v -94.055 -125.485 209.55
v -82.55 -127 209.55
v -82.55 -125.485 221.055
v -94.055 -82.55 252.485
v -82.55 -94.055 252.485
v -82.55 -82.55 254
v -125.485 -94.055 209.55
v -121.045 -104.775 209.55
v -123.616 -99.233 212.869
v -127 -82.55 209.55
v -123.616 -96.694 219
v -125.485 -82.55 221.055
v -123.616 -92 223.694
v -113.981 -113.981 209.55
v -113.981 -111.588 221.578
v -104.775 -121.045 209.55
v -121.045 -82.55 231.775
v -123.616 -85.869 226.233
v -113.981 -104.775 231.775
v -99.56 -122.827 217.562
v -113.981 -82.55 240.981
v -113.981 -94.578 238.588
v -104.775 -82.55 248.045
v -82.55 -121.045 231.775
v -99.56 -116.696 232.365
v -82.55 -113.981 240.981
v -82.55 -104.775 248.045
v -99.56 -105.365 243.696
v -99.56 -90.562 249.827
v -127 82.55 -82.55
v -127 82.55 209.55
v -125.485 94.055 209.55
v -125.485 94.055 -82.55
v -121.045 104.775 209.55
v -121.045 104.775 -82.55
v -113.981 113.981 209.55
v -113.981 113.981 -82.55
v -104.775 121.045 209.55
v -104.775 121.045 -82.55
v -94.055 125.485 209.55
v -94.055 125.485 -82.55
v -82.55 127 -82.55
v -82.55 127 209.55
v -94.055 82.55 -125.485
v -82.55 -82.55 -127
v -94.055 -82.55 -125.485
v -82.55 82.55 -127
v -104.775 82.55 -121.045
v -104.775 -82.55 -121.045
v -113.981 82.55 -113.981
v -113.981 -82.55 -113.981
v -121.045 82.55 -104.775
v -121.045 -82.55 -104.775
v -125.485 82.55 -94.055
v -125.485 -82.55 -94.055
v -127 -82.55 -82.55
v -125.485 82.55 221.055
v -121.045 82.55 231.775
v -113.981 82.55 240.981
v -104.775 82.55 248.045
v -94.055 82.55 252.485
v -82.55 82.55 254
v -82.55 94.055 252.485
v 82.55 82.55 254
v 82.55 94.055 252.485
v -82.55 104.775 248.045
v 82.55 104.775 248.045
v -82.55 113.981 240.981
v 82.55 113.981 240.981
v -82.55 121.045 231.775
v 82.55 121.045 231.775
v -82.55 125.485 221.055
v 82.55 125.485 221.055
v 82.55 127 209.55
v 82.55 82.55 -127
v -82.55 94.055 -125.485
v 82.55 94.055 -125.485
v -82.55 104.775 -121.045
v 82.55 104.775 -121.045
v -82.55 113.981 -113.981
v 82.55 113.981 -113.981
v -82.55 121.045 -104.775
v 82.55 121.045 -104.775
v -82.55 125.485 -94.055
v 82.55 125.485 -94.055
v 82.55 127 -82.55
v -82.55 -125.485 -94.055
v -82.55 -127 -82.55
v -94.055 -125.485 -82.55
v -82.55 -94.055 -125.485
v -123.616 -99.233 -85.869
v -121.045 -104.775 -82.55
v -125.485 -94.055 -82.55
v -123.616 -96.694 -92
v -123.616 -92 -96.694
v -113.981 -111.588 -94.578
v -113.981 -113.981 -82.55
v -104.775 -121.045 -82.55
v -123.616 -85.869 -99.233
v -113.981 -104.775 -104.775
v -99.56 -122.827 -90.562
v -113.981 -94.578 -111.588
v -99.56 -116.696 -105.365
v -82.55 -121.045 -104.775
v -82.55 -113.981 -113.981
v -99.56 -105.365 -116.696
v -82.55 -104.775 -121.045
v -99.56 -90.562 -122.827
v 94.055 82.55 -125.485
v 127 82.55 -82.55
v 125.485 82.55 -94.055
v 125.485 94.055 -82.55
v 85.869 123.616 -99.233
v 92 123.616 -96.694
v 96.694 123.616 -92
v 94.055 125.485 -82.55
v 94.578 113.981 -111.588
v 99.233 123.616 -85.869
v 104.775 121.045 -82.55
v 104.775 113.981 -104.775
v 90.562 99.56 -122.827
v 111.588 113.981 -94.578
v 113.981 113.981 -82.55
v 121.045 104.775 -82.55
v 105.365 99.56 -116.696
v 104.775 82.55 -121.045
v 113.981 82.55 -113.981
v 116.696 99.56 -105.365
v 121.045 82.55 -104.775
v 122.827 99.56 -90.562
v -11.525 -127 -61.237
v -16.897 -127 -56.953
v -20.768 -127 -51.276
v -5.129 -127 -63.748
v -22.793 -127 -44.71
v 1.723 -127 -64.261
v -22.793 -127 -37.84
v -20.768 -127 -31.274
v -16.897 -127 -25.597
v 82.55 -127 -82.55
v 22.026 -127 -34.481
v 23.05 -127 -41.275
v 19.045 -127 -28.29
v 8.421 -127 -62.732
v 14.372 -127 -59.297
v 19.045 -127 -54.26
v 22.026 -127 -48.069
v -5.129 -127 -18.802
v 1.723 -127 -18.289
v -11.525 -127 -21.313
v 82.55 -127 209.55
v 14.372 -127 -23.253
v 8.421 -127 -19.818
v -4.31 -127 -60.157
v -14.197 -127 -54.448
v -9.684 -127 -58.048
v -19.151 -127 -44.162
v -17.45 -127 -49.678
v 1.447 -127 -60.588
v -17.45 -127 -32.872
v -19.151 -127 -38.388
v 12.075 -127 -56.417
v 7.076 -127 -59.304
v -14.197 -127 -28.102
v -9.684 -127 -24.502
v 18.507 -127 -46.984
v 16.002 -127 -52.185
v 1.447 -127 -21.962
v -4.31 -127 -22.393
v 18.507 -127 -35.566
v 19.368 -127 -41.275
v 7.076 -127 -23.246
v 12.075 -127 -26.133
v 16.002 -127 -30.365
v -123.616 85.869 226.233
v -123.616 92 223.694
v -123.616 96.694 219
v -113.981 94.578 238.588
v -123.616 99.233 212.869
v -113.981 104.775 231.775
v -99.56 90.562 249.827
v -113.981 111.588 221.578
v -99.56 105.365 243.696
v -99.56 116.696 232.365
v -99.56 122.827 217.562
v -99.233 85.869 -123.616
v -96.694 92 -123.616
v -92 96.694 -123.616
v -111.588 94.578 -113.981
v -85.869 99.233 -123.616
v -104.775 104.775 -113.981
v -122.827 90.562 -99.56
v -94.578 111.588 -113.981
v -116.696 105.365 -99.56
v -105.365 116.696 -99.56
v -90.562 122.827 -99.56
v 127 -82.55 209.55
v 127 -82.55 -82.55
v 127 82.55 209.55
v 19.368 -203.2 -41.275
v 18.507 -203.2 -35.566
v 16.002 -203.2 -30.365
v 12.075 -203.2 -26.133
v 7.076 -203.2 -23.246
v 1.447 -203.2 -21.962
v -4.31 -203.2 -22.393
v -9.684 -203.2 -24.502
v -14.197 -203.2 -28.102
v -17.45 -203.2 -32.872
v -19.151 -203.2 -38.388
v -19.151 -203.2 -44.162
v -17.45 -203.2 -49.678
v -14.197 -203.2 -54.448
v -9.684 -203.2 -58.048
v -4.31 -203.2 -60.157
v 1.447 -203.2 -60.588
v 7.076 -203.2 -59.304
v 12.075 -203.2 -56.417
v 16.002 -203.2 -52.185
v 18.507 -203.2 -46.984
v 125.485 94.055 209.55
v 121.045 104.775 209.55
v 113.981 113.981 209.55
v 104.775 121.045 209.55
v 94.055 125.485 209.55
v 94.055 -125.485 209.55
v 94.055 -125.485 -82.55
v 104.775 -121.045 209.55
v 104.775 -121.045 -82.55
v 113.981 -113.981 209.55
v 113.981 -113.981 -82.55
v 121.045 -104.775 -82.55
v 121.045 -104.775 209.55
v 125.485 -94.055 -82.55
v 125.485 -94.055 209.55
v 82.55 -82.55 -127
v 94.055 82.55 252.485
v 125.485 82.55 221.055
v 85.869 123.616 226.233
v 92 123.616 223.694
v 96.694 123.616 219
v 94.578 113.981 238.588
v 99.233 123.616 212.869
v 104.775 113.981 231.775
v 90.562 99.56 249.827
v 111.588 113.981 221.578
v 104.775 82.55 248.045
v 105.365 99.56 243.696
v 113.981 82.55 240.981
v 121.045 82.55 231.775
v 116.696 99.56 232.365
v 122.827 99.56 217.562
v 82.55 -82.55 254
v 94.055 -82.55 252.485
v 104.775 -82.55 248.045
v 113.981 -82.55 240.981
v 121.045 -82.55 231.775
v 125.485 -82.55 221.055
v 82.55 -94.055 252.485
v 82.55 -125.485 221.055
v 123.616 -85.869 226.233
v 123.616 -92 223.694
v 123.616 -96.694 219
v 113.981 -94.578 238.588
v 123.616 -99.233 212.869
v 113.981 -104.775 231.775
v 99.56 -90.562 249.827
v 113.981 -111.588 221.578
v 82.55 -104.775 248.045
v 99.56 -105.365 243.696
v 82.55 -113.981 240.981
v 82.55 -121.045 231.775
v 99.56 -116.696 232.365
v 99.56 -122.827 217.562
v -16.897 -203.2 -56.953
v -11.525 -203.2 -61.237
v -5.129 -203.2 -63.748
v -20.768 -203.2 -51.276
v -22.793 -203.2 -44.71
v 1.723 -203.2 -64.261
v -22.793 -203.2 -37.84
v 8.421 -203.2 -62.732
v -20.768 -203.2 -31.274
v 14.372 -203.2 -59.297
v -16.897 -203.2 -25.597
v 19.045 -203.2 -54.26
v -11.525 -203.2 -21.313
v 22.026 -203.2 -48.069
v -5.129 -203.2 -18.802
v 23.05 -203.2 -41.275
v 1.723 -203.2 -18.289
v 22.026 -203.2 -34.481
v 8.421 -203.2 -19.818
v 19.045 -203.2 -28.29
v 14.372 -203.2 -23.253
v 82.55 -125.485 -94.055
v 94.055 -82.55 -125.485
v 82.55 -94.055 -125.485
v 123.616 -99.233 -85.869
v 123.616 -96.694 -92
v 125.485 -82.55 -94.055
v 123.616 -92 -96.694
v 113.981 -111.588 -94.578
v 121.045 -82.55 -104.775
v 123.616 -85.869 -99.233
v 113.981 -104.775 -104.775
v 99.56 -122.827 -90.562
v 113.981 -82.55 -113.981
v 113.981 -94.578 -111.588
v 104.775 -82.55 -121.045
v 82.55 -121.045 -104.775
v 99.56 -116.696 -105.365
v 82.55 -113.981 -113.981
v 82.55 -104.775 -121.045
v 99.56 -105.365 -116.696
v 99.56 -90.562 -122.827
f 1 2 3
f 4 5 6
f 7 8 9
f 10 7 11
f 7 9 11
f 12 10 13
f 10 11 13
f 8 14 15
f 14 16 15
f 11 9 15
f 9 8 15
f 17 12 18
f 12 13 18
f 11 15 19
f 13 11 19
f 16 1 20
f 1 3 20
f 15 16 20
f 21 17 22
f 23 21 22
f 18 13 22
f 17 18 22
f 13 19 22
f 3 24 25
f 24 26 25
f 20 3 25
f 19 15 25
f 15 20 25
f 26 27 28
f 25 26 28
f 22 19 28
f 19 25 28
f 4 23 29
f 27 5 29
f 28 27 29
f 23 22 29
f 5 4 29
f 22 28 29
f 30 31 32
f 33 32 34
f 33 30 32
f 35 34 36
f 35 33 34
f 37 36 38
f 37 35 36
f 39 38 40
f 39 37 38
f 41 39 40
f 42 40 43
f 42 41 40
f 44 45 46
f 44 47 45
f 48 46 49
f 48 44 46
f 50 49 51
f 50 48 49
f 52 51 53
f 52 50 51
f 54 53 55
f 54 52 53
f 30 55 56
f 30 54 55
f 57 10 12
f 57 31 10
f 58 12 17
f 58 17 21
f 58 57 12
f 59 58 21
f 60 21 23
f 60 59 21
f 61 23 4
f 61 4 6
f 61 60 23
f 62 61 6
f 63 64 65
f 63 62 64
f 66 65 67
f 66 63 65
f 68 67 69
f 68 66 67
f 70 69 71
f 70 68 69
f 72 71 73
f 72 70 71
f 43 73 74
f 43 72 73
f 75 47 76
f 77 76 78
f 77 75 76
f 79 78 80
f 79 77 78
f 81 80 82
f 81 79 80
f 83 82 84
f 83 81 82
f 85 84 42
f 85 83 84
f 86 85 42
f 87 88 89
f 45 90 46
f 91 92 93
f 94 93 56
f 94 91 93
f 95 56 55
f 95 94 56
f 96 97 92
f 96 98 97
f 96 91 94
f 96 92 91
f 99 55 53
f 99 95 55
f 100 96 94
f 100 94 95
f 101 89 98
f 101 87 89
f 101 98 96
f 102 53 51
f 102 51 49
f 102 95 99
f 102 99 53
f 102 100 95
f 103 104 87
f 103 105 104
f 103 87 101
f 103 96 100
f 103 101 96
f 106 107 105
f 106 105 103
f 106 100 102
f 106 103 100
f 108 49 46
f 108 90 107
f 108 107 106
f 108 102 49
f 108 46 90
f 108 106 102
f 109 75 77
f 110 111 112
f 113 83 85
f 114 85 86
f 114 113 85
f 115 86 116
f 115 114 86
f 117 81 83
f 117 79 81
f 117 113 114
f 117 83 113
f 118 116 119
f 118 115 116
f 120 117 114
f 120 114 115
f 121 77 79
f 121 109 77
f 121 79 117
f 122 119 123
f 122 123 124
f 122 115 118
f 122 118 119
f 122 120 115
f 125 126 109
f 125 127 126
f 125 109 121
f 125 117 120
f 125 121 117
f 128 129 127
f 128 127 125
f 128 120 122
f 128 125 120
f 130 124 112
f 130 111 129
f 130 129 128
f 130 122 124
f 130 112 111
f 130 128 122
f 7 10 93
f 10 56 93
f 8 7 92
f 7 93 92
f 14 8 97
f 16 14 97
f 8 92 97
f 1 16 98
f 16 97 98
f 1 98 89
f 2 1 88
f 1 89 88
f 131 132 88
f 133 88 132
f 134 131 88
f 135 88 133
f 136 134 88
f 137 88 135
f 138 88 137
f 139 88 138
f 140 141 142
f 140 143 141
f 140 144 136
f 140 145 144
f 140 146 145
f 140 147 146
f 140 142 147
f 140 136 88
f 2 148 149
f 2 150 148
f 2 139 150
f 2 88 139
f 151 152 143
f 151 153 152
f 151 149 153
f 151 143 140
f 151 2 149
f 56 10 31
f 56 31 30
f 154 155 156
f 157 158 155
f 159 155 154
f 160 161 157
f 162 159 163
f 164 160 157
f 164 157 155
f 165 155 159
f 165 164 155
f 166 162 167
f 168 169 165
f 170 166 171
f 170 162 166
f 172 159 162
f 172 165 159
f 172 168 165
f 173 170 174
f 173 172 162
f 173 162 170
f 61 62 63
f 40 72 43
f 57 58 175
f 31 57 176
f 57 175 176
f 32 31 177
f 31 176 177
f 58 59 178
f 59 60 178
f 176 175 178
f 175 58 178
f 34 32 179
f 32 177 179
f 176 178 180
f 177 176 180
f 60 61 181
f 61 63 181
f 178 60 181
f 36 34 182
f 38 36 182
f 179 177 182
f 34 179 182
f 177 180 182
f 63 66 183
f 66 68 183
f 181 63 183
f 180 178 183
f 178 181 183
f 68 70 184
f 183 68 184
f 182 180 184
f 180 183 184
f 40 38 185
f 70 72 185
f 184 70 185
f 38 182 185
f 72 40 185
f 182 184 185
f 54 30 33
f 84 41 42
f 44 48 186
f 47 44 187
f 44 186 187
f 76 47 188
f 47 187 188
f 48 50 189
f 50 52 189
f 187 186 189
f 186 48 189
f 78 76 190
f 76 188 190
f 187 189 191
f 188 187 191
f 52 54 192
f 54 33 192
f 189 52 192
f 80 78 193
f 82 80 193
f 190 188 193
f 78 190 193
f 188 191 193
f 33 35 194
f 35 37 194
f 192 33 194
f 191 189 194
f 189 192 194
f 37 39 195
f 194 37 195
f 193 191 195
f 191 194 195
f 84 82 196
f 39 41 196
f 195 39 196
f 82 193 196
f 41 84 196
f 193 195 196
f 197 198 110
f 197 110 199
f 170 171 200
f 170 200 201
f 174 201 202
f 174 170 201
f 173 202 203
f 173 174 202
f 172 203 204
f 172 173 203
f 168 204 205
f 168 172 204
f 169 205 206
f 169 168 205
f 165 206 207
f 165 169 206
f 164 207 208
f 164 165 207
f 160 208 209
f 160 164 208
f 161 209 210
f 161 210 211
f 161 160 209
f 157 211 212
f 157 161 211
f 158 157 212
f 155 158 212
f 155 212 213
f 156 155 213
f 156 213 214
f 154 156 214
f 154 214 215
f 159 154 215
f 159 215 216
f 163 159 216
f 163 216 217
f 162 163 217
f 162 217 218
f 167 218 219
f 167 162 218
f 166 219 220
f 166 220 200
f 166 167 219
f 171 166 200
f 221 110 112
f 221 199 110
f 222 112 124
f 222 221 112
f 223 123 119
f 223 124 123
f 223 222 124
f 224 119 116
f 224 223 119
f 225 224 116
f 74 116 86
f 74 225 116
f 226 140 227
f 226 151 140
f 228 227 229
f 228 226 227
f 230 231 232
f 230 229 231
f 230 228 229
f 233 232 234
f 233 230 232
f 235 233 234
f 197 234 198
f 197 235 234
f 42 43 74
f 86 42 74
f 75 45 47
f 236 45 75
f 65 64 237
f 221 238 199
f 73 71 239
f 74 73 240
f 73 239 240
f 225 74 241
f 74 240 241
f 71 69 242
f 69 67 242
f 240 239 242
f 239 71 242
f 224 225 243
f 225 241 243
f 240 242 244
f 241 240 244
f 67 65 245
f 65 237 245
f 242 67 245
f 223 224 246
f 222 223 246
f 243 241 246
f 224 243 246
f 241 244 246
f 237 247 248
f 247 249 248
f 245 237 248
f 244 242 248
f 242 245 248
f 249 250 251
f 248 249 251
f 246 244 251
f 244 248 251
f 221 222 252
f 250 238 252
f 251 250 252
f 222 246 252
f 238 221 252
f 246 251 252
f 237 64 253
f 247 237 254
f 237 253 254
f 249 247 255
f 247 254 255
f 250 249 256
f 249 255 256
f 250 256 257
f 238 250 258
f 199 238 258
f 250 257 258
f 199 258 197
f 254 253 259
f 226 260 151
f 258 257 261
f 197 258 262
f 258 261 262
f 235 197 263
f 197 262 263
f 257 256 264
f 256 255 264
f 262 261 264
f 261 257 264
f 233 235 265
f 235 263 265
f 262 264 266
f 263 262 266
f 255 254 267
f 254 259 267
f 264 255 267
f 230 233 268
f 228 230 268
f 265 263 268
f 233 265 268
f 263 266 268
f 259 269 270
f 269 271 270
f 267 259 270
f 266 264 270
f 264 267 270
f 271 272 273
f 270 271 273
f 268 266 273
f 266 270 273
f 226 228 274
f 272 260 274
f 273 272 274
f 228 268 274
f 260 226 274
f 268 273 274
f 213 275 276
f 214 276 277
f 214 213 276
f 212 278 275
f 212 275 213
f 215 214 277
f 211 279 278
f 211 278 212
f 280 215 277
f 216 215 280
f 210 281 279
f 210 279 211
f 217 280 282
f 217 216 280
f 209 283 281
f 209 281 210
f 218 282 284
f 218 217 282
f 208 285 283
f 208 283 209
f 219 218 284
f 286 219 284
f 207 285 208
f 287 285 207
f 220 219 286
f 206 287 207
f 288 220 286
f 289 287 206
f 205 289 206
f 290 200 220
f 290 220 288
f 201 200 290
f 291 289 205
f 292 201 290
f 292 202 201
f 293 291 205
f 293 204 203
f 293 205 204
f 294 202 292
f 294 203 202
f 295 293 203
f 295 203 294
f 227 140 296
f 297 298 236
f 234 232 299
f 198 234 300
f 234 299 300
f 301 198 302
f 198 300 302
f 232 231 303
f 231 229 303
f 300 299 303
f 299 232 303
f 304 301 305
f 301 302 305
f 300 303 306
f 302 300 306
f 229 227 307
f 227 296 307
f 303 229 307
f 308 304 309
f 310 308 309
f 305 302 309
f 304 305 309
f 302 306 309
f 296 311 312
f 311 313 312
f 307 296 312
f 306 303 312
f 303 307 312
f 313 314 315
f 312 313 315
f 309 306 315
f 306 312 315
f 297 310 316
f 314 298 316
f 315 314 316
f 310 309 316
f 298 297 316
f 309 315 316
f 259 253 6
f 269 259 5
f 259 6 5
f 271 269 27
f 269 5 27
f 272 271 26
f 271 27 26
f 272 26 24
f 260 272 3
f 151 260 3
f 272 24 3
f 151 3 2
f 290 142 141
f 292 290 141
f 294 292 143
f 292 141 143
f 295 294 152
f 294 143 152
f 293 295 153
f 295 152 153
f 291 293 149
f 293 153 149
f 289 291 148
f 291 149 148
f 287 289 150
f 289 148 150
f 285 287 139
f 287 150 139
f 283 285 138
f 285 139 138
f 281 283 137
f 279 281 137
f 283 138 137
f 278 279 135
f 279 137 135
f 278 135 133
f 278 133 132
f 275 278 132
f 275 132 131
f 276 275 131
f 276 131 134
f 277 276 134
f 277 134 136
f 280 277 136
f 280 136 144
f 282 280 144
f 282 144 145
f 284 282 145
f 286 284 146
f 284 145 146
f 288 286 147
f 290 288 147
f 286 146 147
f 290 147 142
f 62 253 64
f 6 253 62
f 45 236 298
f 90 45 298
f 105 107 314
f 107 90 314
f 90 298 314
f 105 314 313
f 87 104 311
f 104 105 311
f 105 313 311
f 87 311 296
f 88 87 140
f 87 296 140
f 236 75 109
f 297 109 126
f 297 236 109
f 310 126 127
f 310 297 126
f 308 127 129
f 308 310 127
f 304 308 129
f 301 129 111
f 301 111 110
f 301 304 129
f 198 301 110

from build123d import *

# Parameters (mm, degrees)
F1_DEPTH = 127
F2_R     = 44.45
F3_R     = 23.0505
F3_R_2   = 19.3675
F4_DEPTH = 76.2


with BuildPart() as f1:
    # F0 (on Front) → F1 (new body, symmetric)
    with BuildSketch(Plane.XZ):
        Polygon((-127, -127), (0, -127), (127, -127), (127, 254), (-127, 254), align=None)
    extrude(amount=F1_DEPTH, both=True)

    # F2
    f2_edges = [f1.edges().sort_by_distance(p)[0] for p in [
        (0, -127, 254),
        (127, 0, 254),
        (0, -127, -127),
        (127, -127, 63.5),
        (-127, -127, 63.5),
        (127, 0, -127),
        (0, 127, 254),
        (-127, 0, 254),
        (-127, 127, 63.5),
        (-127, 0, -127),
        (0, 127, -127),
        (127, 127, 63.5),
    ]]
    fillet(f2_edges, radius=F2_R)

    # F3 (on face) → F4 (join)
    with BuildSketch(Plane.XZ.offset(127)):
        with Locations((0, -41.275)):
            Circle(F3_R)
        with Locations((0, -41.275)):
            Circle(F3_R_2, mode=Mode.SUBTRACT)
    extrude(amount=F4_DEPTH)


solid = f1.part
